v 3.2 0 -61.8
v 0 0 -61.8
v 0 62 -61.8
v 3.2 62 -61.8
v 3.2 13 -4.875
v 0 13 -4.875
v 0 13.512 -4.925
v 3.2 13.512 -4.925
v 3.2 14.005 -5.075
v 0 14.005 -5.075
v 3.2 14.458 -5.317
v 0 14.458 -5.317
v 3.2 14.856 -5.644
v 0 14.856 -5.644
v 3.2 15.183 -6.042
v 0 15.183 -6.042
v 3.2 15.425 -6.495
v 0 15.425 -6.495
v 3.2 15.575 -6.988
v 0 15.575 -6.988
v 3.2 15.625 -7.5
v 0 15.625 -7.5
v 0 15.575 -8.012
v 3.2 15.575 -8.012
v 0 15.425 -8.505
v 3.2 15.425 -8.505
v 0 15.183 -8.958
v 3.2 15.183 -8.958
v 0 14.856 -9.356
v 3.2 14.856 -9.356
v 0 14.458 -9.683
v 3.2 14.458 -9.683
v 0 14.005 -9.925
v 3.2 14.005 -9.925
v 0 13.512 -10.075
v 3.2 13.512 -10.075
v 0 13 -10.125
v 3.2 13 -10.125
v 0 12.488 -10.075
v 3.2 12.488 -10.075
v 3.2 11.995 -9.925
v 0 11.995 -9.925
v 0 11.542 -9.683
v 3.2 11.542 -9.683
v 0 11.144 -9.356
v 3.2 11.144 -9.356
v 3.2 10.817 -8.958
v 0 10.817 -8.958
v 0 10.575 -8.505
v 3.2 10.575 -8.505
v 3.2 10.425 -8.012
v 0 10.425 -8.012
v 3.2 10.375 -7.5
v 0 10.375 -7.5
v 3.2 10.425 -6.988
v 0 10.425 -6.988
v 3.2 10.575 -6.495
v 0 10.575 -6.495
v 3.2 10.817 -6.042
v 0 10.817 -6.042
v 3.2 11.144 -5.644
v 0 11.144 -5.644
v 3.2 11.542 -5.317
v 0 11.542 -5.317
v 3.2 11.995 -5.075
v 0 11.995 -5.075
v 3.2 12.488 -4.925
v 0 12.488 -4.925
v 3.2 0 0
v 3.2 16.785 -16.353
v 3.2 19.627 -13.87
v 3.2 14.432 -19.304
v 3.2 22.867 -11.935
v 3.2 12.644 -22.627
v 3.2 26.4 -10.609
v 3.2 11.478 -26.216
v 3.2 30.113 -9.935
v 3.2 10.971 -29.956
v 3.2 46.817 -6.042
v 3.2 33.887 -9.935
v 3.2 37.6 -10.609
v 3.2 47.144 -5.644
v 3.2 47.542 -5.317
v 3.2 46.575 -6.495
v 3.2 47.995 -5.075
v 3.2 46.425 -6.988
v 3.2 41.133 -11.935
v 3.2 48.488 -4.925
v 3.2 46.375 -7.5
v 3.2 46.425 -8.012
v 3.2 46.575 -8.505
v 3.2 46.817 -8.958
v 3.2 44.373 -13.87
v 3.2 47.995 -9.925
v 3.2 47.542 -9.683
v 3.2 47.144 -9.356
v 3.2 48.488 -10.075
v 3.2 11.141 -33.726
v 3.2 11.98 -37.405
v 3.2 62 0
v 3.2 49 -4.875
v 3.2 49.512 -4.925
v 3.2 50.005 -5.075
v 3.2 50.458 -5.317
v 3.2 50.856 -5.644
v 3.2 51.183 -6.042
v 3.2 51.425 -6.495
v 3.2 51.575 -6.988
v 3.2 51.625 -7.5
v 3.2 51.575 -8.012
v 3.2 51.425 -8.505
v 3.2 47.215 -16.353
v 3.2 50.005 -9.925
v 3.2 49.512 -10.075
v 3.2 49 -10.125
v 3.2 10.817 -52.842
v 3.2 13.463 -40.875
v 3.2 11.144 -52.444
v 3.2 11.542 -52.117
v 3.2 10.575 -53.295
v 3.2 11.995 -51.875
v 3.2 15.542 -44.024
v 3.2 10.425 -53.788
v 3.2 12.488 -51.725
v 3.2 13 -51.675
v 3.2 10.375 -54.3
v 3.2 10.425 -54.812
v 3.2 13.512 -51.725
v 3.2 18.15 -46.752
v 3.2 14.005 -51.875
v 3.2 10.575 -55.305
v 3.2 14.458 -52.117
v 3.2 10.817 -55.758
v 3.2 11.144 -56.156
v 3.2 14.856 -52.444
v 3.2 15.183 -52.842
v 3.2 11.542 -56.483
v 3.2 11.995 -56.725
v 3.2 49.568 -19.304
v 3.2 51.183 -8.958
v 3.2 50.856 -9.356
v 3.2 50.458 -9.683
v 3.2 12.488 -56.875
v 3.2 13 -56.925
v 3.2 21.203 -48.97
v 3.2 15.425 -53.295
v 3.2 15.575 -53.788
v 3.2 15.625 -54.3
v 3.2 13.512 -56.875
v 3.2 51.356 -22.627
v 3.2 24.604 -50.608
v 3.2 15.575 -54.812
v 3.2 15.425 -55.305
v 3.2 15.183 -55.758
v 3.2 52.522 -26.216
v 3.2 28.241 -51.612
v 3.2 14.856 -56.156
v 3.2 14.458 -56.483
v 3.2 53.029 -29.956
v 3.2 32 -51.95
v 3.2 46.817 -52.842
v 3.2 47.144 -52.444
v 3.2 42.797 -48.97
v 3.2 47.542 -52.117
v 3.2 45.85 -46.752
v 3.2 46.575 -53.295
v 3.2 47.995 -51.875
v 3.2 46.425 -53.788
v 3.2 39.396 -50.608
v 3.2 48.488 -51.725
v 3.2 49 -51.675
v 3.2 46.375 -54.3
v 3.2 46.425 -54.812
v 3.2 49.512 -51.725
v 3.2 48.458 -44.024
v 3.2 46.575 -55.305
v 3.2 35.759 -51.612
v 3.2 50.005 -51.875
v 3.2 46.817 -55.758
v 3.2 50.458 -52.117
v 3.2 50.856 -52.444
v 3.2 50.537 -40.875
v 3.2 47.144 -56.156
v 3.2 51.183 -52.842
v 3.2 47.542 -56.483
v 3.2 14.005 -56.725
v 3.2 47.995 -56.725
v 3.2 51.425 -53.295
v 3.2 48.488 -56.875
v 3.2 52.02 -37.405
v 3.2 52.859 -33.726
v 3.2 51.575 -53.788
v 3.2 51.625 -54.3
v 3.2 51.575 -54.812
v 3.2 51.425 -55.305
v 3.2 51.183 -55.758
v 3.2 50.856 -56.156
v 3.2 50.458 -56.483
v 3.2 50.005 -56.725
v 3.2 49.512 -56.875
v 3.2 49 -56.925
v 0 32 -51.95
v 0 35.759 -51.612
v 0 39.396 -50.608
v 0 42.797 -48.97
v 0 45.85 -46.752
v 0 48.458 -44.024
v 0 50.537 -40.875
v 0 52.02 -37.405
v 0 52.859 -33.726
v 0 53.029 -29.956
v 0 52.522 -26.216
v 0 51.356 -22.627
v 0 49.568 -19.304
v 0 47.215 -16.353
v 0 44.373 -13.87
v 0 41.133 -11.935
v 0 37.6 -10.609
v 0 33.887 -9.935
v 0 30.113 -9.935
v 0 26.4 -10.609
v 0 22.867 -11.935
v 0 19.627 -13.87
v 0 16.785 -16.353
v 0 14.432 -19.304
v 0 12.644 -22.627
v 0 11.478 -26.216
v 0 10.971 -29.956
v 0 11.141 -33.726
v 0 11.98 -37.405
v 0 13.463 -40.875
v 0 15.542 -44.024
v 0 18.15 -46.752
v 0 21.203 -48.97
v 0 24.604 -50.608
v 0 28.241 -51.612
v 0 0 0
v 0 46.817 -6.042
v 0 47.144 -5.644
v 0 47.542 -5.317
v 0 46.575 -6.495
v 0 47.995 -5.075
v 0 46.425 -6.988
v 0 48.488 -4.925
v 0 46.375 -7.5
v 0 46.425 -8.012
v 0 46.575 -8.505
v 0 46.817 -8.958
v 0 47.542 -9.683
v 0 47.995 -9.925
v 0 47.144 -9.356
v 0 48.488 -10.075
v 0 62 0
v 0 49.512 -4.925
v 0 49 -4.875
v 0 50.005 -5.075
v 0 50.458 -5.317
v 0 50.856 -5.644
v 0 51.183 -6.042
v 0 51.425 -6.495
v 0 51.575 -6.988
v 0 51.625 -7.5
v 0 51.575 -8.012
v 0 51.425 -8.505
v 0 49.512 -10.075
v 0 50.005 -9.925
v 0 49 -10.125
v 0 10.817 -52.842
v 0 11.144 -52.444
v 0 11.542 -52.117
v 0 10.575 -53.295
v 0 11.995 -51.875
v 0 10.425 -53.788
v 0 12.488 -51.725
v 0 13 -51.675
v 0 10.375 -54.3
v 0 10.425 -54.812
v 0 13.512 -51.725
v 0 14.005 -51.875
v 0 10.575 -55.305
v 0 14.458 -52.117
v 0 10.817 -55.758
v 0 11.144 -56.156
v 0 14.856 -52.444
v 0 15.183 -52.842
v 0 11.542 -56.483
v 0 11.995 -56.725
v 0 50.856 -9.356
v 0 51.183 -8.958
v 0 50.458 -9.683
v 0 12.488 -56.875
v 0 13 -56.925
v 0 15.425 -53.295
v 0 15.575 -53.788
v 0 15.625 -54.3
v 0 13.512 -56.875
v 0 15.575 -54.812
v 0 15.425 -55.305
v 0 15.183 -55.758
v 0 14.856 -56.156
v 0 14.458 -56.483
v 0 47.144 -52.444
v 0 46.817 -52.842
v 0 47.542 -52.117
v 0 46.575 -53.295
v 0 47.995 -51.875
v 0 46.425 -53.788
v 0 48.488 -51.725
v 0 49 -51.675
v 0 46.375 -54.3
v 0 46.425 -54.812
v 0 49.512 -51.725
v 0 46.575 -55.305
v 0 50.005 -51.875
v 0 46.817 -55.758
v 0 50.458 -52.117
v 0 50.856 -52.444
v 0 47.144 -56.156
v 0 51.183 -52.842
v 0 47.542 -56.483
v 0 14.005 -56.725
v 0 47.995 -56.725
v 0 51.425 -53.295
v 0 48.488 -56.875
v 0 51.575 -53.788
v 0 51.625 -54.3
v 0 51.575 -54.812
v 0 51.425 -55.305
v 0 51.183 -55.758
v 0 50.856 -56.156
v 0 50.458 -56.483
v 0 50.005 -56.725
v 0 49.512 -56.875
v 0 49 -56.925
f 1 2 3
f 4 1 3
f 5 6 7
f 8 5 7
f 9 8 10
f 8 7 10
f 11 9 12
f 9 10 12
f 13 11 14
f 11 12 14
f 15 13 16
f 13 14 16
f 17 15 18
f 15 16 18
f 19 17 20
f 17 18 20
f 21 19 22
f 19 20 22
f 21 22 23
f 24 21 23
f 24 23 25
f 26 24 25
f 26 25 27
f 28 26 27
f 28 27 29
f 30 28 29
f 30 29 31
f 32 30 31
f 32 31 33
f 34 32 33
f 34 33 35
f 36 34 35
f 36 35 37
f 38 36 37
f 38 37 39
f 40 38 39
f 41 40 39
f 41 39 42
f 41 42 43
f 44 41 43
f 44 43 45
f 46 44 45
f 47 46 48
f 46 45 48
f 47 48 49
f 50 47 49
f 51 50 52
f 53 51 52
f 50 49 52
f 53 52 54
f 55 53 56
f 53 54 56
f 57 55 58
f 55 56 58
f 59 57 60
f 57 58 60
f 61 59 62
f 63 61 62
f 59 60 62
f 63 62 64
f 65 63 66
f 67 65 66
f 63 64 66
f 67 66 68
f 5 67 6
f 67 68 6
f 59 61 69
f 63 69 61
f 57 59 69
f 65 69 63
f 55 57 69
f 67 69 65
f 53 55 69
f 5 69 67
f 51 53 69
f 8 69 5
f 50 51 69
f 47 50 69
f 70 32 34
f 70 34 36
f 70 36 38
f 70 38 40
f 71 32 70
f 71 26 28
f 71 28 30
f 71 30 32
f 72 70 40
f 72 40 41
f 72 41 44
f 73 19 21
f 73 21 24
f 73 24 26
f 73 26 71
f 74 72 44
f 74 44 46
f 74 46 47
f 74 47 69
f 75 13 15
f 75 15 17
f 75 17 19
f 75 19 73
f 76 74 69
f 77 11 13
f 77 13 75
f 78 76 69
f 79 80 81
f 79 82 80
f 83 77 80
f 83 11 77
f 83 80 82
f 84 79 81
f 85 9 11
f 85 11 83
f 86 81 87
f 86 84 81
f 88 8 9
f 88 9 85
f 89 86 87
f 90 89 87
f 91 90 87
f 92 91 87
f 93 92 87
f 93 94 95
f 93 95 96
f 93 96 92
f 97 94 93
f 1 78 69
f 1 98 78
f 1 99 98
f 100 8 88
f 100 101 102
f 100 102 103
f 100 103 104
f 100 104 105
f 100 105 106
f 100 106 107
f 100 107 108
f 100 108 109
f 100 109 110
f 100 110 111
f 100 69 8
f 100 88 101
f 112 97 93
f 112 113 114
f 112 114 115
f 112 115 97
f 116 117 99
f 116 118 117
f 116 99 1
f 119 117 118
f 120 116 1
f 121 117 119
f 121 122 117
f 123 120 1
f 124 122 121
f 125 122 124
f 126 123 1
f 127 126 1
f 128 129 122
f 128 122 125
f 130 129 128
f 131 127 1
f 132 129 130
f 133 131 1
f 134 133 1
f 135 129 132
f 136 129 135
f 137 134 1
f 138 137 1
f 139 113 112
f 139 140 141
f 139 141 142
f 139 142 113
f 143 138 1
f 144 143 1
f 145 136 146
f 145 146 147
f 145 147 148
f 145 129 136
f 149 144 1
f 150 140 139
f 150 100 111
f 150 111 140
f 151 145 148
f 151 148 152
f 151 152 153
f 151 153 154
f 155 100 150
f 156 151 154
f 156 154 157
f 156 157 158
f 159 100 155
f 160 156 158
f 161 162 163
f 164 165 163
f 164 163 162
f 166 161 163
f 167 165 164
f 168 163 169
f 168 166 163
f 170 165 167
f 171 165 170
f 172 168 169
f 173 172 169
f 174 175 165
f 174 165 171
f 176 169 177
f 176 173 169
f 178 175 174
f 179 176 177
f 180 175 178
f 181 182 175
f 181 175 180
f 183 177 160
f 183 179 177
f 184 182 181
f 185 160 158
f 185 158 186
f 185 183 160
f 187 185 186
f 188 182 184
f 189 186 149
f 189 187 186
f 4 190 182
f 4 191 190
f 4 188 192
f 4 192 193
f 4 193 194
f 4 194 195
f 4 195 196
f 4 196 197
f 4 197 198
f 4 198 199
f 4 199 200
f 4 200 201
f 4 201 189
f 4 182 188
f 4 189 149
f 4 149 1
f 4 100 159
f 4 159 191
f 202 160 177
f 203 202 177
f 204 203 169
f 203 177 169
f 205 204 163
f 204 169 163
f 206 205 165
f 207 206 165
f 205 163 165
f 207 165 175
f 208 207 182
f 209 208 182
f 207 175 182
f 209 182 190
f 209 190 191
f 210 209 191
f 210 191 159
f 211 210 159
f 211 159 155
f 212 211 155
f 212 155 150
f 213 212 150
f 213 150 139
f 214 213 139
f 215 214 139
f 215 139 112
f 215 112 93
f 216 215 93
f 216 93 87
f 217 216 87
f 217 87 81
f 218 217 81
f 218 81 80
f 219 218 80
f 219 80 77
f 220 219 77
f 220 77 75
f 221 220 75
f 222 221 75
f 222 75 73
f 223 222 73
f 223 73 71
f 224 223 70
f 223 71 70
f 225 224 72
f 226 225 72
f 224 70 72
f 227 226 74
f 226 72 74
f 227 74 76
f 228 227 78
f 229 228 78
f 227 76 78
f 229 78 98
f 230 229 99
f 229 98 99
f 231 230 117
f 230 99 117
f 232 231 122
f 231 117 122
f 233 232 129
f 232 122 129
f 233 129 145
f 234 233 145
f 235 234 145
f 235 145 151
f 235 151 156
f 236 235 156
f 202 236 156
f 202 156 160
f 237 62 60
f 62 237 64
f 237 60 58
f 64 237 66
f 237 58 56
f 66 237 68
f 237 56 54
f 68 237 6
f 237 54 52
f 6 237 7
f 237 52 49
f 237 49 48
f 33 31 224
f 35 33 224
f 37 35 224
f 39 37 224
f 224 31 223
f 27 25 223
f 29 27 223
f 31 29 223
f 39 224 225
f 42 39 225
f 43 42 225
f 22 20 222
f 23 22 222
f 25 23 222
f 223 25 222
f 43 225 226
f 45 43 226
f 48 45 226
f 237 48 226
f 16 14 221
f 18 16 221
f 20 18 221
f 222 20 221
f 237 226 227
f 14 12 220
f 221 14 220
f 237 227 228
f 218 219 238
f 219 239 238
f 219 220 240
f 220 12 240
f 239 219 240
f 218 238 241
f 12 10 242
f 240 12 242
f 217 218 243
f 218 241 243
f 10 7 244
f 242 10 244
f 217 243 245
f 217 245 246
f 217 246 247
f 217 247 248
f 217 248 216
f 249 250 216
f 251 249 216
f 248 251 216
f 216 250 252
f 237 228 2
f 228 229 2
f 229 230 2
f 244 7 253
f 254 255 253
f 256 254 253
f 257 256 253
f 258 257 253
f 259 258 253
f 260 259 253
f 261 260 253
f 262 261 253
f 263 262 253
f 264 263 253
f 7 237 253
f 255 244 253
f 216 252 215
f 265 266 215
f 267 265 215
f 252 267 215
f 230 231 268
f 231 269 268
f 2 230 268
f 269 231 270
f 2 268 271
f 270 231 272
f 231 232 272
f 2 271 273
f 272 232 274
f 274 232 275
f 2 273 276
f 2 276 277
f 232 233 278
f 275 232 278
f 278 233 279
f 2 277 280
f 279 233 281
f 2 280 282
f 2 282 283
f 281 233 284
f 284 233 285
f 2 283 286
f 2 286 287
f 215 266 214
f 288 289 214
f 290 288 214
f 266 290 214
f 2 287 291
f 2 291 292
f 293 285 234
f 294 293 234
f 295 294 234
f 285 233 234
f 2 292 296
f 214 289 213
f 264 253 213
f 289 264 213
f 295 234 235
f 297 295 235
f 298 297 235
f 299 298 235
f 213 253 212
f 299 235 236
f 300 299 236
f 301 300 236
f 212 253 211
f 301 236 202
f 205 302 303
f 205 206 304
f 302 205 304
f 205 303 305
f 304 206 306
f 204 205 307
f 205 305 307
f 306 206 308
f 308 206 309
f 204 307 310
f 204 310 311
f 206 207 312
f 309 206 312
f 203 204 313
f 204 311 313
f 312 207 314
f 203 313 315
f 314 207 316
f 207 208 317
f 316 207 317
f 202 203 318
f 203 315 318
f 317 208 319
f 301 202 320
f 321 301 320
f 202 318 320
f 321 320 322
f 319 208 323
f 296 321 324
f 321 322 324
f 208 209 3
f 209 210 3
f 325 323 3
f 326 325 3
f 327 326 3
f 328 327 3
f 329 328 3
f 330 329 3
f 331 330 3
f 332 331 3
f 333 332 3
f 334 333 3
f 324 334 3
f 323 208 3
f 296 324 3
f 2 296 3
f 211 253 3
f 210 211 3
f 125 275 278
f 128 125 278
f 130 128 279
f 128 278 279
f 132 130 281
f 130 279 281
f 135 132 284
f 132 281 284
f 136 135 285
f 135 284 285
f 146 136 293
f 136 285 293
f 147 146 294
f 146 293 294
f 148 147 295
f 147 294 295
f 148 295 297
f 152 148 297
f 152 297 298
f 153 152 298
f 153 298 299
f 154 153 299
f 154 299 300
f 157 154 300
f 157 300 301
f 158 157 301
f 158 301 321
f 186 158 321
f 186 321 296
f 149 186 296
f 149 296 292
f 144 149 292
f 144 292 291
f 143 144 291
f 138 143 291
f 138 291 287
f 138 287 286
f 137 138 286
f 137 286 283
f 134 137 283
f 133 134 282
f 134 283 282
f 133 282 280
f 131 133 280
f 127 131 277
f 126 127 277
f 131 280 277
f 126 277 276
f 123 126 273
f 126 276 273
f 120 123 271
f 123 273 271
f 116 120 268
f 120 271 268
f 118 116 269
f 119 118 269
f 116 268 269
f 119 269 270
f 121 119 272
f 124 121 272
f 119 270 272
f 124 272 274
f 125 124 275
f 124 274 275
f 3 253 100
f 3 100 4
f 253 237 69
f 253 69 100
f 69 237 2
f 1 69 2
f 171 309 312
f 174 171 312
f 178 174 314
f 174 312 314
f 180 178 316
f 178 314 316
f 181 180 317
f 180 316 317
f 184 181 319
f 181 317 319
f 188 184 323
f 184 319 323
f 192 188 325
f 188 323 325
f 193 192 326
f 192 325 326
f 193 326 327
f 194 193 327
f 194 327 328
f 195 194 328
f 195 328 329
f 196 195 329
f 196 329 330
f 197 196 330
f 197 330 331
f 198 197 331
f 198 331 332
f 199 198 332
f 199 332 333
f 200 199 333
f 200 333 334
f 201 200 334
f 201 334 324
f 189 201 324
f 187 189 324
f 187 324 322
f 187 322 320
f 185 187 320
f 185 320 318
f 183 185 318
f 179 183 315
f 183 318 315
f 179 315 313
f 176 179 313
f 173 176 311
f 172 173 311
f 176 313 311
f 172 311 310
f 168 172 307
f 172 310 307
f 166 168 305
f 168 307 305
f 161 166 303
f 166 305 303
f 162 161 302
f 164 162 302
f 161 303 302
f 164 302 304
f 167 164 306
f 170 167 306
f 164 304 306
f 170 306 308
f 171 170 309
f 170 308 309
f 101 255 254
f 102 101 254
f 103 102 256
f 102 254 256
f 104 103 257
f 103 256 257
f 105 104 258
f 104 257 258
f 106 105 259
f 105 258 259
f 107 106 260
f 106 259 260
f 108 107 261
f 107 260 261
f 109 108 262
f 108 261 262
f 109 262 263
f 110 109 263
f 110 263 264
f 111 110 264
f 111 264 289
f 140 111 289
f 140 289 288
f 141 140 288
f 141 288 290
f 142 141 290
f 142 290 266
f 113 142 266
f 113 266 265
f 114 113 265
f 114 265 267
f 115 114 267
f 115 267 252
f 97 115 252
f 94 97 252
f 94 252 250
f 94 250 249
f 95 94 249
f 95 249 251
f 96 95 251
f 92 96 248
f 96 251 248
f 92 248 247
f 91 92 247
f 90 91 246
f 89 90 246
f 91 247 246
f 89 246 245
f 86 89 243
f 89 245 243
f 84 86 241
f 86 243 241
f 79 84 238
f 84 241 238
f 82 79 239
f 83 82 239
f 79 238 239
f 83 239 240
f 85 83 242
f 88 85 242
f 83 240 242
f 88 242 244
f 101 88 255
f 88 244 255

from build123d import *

# Parameters (mm, degrees)
SKETCH1_W           = 61.8
SKETCH1_H           = 62
BOSS_EXTRUDE1_DEPTH = 3.2
CUT_EXTRUDE1_REACH  = 5.2
SKETCH2_R           = 21.05
CUT_EXTRUDE2_REACH  = 5.2
SKETCH3_R           = 2.625


with BuildPart() as part:
    # Sketch1 → Boss-Extrude1 (new body)
    with BuildSketch(Plane(origin=(0, 0, 0), x_dir=(0, 0, -1), z_dir=(1, 0, 0))):
        with Locations((30.9, 31)):
            Rectangle(SKETCH1_W, SKETCH1_H)
    extrude(amount=BOSS_EXTRUDE1_DEPTH)

    # Sketch2 → Cut-Extrude1 (cut, up to next)
    with BuildSketch(Plane(origin=(3.2, 0, 0), x_dir=(0, 0, -1), z_dir=(1, 0, 0)), mode=Mode.PRIVATE) as cut_extrude1_sk1:
        with Locations((30.9, 32)):
            Circle(SKETCH2_R)
    cut_extrude1_tool1 = extrude(cut_extrude1_sk1.sketch, amount=-CUT_EXTRUDE1_REACH, mode=Mode.PRIVATE) & part.part
    add(cut_extrude1_tool1.solids().sort_by_distance((3.2, 32, -30.9))[0], mode=Mode.SUBTRACT)

    # Sketch3 → Cut-Extrude2 (cut, up to next)
    with BuildSketch(Plane.ZY, mode=Mode.PRIVATE) as cut_extrude2_sk1:
        with Locations((-54.3, 49)):
            Circle(SKETCH3_R)
    cut_extrude2_tool1 = extrude(cut_extrude2_sk1.sketch, amount=-CUT_EXTRUDE2_REACH, mode=Mode.PRIVATE) & part.part
    add(cut_extrude2_tool1.solids().sort_by_distance((0, 49, -54.3))[0], mode=Mode.SUBTRACT)
    # Sketch3 → Cut-Extrude2 (cut, up to next)
    with BuildSketch(Plane.ZY, mode=Mode.PRIVATE) as cut_extrude2_sk2:
        with Locations((-54.3, 13)):
            Circle(SKETCH3_R)
    cut_extrude2_tool2 = extrude(cut_extrude2_sk2.sketch, amount=-CUT_EXTRUDE2_REACH, mode=Mode.PRIVATE) & part.part
    add(cut_extrude2_tool2.solids().sort_by_distance((0, 13, -54.3))[0], mode=Mode.SUBTRACT)
    # Sketch3 → Cut-Extrude2 (cut, up to next)
    with BuildSketch(Plane.ZY, mode=Mode.PRIVATE) as cut_extrude2_sk3:
        with Locations((-7.5, 49)):
            Circle(SKETCH3_R)
    cut_extrude2_tool3 = extrude(cut_extrude2_sk3.sketch, amount=-CUT_EXTRUDE2_REACH, mode=Mode.PRIVATE) & part.part
    add(cut_extrude2_tool3.solids().sort_by_distance((0, 49, -7.5))[0], mode=Mode.SUBTRACT)
    # Sketch3 → Cut-Extrude2 (cut, up to next)
    with BuildSketch(Plane.ZY, mode=Mode.PRIVATE) as cut_extrude2_sk4:
        with Locations((-7.5, 13)):
            Circle(SKETCH3_R)
    cut_extrude2_tool4 = extrude(cut_extrude2_sk4.sketch, amount=-CUT_EXTRUDE2_REACH, mode=Mode.PRIVATE) & part.part
    add(cut_extrude2_tool4.solids().sort_by_distance((0, 13, -7.5))[0], mode=Mode.SUBTRACT)


solid = part.part
